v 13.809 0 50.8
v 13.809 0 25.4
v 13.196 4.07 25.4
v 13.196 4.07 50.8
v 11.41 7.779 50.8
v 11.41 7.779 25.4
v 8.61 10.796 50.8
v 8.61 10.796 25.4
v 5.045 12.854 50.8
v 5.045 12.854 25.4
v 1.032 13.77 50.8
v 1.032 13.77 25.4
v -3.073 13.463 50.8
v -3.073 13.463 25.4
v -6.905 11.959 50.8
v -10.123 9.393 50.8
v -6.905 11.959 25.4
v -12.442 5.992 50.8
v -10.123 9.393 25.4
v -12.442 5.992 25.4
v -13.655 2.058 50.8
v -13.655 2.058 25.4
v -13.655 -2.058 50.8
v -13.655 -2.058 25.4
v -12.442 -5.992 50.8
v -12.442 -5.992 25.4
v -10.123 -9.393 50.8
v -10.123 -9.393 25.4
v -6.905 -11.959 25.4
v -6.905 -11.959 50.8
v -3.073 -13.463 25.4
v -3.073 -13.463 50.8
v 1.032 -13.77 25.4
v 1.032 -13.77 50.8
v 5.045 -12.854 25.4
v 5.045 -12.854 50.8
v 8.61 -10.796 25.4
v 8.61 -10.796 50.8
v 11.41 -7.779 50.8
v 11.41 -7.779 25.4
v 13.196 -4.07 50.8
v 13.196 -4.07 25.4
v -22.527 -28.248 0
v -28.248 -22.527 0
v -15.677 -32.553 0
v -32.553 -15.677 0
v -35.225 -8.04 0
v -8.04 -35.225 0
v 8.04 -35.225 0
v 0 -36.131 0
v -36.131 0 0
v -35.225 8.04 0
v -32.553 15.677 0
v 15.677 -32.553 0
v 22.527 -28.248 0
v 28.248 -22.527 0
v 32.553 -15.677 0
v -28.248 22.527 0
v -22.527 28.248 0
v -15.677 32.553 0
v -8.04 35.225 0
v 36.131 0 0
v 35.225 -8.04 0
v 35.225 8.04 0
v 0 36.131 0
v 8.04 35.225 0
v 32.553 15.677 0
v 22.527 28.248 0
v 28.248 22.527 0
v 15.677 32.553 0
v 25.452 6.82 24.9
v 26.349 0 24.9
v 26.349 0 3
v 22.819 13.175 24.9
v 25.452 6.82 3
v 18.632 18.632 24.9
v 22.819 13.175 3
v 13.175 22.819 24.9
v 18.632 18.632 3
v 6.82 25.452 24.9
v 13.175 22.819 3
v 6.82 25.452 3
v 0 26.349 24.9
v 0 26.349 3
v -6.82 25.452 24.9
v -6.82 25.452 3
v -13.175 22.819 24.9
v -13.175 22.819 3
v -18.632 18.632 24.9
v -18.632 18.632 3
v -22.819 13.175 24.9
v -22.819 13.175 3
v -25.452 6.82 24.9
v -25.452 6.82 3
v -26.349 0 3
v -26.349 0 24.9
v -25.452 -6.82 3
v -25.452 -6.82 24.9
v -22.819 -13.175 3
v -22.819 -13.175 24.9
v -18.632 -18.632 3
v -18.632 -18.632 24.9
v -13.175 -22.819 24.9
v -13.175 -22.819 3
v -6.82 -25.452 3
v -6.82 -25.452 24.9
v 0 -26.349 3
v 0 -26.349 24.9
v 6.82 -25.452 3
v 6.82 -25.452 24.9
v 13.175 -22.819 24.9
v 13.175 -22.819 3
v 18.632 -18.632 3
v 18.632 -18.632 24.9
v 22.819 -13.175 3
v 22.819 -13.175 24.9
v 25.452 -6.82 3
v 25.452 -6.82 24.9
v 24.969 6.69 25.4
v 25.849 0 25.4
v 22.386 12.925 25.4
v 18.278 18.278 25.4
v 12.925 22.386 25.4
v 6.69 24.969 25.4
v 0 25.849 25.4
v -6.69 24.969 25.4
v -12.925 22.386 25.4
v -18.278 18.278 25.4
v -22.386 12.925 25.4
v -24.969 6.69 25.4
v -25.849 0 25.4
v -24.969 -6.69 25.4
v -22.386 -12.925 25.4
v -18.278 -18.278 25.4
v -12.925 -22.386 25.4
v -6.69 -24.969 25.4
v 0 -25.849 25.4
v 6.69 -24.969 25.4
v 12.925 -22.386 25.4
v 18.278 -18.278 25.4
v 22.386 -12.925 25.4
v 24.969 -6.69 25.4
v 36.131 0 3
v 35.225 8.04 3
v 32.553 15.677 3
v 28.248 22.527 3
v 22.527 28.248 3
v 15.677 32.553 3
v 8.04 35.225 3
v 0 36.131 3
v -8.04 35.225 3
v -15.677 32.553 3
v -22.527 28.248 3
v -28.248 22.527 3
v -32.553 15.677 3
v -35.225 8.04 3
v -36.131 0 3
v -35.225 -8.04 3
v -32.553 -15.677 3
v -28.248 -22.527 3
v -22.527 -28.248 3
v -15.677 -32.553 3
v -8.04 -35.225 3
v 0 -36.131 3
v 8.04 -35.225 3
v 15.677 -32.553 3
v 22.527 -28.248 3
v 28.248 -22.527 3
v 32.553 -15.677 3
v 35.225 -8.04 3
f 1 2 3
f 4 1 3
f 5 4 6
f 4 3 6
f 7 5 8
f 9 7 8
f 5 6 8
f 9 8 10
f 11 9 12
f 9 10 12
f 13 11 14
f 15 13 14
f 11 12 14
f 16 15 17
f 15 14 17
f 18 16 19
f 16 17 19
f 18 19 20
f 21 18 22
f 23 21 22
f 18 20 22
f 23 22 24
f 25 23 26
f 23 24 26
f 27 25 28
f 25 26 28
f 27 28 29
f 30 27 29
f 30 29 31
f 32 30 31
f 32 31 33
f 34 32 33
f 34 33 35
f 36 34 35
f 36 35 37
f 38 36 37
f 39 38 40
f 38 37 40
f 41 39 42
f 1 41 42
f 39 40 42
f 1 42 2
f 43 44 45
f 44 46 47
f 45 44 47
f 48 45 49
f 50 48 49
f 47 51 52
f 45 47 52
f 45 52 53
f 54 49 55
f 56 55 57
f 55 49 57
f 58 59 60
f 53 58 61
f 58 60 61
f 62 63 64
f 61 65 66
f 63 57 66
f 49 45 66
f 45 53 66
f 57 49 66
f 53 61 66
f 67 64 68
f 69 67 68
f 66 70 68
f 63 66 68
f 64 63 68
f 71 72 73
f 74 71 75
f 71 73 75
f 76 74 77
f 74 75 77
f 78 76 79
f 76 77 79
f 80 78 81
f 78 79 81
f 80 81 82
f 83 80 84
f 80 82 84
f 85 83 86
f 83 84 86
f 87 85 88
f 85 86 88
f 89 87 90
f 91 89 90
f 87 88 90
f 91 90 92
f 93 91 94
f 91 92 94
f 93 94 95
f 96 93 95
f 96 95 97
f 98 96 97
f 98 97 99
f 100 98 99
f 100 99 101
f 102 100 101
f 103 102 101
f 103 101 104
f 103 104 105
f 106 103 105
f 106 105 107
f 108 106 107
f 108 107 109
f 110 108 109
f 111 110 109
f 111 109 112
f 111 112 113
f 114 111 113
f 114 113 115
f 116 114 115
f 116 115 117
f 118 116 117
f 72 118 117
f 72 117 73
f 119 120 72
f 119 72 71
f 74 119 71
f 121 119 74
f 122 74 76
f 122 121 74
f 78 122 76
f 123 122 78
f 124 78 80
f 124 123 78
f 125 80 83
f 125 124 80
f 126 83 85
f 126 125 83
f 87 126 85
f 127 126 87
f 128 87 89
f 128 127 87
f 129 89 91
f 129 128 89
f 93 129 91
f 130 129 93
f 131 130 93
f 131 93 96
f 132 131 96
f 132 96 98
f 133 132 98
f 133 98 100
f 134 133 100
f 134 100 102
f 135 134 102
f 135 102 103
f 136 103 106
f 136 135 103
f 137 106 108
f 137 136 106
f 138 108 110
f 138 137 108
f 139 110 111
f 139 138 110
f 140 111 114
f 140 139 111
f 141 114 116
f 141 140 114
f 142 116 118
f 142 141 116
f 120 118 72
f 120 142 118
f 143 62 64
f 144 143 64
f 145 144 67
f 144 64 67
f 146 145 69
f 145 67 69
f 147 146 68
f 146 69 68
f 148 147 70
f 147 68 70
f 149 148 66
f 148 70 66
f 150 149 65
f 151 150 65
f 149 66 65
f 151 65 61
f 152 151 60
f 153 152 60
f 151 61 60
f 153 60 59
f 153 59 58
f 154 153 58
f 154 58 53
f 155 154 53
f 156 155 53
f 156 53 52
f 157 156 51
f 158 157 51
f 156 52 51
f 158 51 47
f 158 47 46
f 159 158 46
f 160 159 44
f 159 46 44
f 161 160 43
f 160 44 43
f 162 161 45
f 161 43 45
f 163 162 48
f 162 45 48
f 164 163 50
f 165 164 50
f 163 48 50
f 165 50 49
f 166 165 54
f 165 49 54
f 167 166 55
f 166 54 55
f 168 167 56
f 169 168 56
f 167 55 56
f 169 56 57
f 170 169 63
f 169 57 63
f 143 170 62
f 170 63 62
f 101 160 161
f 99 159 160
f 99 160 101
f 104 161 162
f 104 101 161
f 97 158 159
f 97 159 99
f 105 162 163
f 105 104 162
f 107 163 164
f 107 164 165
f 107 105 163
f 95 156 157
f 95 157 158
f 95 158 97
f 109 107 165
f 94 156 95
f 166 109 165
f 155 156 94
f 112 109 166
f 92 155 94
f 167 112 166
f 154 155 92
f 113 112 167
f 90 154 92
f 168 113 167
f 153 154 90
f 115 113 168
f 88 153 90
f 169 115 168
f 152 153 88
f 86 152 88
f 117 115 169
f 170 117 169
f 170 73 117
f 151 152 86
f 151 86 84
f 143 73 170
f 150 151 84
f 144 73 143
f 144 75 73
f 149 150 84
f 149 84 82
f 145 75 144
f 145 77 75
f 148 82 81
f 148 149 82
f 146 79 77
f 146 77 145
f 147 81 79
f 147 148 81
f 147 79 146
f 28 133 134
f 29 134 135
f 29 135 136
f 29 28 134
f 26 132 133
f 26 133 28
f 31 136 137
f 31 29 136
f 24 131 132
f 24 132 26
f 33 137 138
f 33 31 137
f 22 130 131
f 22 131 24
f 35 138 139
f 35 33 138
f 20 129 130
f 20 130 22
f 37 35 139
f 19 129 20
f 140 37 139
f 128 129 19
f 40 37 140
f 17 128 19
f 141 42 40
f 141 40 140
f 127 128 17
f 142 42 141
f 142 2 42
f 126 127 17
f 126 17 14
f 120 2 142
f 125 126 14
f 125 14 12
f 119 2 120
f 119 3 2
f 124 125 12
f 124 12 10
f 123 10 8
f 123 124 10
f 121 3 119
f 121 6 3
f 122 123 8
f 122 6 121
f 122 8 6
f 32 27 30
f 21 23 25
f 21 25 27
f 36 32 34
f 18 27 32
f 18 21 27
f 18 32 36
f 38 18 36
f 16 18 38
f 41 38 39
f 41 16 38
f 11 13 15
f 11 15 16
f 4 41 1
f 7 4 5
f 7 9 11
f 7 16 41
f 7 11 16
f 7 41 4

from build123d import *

# Parameters (mm, degrees)
F0_R     = 36.130813
F1_DEPTH = 3
F2_R     = 26.349485
F3_DEPTH = 25.4
F4_R     = 13.809058
F5_DEPTH = 25.4
F6_SIZE  = 0.5


with BuildPart() as f1:
    # F0 (on Top) → F1 (new body)
    with BuildSketch(Plane.XY):
        Circle(F0_R)
    extrude(amount=F1_DEPTH)

    # F2 (on Top) → F3 (join)
    with BuildSketch(Plane.XY):
        Circle(F2_R)
    extrude(amount=F3_DEPTH)

    # F4 (on face) → F5 (join)
    with BuildSketch(Plane.XY.offset(25.4)):
        Circle(F4_R)
    extrude(amount=F5_DEPTH)

    # F6
    f6_edges = [f1.edges().sort_by_distance(p)[0] for p in [
        (-26.349485, 0, 25.4),
    ]]
    chamfer(f6_edges, length=F6_SIZE)


solid = f1.part
